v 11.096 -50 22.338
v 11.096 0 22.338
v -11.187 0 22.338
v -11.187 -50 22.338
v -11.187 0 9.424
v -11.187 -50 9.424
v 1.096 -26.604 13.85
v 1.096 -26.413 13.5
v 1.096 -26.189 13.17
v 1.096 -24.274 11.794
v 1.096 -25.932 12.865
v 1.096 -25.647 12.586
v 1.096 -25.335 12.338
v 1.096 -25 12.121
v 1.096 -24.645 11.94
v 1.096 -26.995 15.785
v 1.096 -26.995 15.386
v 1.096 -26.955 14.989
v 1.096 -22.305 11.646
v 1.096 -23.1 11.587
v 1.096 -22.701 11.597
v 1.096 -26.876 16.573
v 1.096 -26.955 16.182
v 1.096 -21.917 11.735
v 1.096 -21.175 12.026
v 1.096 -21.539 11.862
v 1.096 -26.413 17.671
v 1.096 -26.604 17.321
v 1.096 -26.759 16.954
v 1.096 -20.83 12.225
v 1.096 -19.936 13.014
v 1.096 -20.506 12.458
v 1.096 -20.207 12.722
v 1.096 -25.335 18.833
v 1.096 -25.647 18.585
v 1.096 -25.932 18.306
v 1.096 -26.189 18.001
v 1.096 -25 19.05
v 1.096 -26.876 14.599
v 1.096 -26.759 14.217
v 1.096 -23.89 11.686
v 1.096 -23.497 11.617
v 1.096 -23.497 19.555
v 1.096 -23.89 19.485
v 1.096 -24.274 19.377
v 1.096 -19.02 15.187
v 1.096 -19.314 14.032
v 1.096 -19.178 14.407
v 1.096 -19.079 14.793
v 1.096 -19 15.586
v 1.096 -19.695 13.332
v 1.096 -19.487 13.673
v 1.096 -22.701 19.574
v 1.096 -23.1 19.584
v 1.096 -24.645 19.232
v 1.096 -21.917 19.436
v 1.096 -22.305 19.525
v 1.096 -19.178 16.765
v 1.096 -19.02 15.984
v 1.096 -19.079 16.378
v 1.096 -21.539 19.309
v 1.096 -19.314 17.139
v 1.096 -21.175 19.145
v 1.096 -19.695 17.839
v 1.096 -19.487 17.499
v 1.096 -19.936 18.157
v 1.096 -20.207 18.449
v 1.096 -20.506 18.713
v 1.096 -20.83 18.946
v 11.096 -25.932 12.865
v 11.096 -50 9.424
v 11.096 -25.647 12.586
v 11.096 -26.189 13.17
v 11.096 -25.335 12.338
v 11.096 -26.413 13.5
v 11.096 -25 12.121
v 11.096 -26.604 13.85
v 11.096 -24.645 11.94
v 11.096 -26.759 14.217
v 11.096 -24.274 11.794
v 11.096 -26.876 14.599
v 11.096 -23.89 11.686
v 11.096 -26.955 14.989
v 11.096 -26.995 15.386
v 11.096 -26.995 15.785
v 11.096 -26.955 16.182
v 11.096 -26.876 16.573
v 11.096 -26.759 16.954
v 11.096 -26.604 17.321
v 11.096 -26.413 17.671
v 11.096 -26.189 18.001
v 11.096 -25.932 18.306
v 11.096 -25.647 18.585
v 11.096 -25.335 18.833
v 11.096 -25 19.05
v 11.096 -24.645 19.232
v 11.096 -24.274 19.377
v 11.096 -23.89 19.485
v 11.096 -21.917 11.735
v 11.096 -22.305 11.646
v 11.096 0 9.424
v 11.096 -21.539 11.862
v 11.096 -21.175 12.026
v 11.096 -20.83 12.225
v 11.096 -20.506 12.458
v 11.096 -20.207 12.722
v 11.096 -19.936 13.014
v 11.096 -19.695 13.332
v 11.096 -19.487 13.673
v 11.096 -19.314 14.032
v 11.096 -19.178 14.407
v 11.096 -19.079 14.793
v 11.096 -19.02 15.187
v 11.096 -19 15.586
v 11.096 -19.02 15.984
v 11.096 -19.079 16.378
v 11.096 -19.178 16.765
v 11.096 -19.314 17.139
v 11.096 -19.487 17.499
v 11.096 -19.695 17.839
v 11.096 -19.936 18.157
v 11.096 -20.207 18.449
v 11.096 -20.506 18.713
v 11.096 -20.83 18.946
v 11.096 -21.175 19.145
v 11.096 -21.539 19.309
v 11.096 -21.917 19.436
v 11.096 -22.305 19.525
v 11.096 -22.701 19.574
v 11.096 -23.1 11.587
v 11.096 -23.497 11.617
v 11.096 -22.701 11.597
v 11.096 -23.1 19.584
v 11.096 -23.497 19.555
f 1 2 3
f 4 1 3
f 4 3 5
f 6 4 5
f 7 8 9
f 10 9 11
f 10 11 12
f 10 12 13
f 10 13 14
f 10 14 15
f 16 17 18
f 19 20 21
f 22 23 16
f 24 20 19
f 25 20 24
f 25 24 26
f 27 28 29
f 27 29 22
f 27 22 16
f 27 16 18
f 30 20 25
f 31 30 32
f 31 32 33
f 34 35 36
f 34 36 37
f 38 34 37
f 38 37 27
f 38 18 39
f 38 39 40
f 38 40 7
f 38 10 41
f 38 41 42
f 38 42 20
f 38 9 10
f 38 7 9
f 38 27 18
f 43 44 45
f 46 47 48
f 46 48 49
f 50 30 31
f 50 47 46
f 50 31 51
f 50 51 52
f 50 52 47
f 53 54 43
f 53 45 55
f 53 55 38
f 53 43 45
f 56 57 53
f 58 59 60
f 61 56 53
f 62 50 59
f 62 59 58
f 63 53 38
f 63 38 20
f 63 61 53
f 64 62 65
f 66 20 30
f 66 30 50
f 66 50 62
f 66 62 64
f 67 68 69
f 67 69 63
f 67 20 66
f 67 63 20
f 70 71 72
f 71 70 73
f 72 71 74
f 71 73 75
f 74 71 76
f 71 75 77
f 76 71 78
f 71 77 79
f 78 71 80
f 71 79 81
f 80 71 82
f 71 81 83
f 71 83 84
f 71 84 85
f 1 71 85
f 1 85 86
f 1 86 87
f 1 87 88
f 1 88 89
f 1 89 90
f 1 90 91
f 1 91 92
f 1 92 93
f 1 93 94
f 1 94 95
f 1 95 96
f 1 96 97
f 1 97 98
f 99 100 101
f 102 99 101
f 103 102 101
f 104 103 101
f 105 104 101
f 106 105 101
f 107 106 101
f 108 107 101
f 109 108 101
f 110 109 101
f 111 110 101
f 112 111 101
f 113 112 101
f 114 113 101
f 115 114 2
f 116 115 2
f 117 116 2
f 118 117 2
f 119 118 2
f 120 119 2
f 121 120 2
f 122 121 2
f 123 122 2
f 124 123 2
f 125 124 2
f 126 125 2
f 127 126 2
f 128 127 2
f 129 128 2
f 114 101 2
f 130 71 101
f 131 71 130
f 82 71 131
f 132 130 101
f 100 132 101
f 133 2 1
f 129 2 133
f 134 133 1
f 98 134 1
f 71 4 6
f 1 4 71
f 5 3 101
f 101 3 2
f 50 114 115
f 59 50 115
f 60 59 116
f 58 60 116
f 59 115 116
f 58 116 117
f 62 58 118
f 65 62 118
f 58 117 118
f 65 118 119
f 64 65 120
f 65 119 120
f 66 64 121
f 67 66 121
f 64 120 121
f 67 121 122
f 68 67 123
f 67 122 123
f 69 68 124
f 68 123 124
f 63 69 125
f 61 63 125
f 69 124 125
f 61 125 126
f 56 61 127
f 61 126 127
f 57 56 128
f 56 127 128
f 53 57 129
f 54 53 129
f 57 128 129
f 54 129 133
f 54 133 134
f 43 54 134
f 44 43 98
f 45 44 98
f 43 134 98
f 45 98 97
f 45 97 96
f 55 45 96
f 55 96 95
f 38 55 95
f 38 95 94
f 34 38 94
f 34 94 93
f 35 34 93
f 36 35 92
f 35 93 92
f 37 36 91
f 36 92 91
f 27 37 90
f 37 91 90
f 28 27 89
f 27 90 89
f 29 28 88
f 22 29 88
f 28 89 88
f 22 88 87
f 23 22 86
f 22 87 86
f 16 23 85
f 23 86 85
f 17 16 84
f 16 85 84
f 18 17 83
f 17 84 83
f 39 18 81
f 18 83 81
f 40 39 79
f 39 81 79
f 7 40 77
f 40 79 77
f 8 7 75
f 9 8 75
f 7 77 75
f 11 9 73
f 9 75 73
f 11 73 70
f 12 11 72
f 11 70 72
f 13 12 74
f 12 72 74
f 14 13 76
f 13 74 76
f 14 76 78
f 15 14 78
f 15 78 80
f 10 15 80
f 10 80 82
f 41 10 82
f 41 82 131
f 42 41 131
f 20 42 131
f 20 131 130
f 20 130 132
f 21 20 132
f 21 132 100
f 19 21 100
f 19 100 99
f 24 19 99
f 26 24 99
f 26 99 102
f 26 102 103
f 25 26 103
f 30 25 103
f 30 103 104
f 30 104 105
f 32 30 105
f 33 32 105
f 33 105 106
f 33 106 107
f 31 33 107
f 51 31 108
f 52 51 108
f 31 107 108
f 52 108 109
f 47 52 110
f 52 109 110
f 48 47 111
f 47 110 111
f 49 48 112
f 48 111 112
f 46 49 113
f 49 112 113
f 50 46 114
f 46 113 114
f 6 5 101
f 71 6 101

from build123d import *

# Parameters (mm, degrees)
F1_DEPTH = 50
F2_R     = 4
F3_DEPTH = 10


with BuildPart() as f1:
    # F0 (on Front) → F1 (new body)
    with BuildSketch(Plane.XZ):
        Polygon((11.096148, 22.337567), (-11.187021, 22.337567), (-11.187021, 9.424148), (0.017039, 9.424148), (11.096148, 9.424148), align=None)
    extrude(amount=F1_DEPTH)

    # F2 (on face) → F3 (cut)
    with BuildSketch(Plane.YZ.offset(11.096148)):
        with Locations((-23, 15.585567)):
            Circle(F2_R)
    extrude(amount=-F3_DEPTH, mode=Mode.SUBTRACT)


solid = f1.part
